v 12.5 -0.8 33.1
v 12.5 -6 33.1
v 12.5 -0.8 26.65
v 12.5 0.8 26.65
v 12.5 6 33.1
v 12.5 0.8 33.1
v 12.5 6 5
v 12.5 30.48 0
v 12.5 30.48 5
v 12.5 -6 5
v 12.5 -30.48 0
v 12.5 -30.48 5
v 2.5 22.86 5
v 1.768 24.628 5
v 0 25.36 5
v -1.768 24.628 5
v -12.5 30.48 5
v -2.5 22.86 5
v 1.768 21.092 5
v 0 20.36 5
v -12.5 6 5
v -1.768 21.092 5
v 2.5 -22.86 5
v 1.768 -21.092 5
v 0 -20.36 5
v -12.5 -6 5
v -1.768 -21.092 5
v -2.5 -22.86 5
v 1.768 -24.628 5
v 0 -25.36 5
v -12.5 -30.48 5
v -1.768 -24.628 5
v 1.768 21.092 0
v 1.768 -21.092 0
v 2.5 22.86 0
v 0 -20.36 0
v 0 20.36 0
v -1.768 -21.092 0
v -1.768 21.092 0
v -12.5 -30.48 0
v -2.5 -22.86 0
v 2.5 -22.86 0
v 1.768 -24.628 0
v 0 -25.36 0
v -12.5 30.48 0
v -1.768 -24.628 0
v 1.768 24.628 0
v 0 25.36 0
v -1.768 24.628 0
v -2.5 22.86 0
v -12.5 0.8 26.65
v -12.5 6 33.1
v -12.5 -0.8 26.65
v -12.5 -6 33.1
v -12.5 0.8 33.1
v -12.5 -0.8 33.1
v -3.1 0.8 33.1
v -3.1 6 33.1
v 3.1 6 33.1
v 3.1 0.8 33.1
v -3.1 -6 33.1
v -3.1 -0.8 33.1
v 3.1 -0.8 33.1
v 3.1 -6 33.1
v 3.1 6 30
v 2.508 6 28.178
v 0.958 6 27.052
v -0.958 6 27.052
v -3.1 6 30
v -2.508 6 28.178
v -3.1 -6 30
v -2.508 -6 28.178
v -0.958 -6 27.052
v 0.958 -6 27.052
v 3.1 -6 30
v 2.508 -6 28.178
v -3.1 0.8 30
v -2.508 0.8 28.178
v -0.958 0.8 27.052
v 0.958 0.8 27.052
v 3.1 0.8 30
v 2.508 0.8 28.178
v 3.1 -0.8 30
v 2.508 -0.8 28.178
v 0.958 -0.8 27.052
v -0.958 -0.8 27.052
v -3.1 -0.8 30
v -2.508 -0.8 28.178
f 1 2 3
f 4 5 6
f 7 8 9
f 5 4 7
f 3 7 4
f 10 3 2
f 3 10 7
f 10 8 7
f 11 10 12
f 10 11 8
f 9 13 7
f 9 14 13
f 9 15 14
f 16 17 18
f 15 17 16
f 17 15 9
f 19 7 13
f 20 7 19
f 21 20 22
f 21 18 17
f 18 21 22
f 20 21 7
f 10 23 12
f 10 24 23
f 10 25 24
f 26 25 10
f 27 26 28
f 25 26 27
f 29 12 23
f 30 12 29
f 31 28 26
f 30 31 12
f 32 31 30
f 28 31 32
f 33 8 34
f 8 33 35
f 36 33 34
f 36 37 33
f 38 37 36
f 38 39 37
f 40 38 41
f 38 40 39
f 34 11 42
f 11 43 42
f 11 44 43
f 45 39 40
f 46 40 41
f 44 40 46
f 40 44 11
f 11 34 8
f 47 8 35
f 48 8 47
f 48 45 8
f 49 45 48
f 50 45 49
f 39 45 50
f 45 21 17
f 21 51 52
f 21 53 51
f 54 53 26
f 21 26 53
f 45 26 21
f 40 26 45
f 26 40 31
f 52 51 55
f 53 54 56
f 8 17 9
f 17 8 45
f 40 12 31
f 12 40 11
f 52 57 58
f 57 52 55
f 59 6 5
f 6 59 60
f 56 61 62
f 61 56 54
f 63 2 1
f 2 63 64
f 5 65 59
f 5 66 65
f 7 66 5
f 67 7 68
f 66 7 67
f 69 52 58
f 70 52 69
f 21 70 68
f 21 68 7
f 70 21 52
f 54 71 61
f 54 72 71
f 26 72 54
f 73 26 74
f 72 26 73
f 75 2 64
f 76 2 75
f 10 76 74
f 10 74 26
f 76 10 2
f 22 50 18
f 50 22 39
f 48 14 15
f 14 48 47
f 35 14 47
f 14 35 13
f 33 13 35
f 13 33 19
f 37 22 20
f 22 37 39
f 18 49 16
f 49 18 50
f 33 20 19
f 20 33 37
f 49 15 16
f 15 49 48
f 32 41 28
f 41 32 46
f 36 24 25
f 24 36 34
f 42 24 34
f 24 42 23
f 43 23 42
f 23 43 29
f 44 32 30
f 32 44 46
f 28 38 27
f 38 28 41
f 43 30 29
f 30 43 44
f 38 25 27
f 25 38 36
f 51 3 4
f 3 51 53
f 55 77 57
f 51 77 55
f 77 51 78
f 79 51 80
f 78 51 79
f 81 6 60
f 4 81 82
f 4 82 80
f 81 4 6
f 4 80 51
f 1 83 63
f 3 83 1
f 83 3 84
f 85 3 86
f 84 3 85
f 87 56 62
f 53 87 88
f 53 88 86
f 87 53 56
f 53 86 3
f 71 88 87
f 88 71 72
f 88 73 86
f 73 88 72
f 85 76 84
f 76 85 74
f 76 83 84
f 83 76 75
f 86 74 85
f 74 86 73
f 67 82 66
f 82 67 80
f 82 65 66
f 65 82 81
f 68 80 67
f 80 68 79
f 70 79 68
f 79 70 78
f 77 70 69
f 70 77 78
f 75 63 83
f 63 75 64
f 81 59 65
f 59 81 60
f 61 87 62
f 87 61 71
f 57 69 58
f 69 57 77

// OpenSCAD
//Change to suit your system

// 60cc
//syringe_plung_thickness = 2.6;
//syringe_outer_diameter = 30.7;

// 10cc
//syringe_plung_thickness = 1.9;
//syringe_outer_diameter = 16.5;

// 3cc
//syringe_plung_thickness = 1.8;
//syringe_outer_diameter = 10.65;

// 1cc
syringe_plung_thickness = 1.6;
syringe_outer_diameter = 6.2;

center_of_rotation = 30;    // just an example




// Don't change unless you know what you are doing
percent_above_center_of_rotation = .5;
screw_hole_r = 2.5;     // automaticly 10mm away from edge of part
baseplate_w = 50;   // redefined in if
baseplate_h = 5;
baseplate_l = 7.62*8;   //MUST be divisable by 7.62 to fit on MEC board

upperslate_l = 12;  // redefined in if
upperslate_h = center_of_rotation+syringe_outer_diameter*percent_above_center_of_rotation; //simply the center of rotation plus any additional height added


if (syringe_outer_diameter <= 15) {
    baseplate_w = 25;
    upperslate_l = 12;

    difference() {
        // Main body
        union(){
            
            // Base Plate
            translate([0,0,2.5])
            cube([baseplate_w,baseplate_l,baseplate_h],center=true);
            
            // Upper Slate
            translate([0,0,upperslate_h/2])
            cube([baseplate_w,upperslate_l,upperslate_h],center=true);
        }
        
        // Screw holes
        translate([0,baseplate_l/2-7.62,0])
        cylinder (h=300,r=screw_hole_r);
        
        translate([0,-(baseplate_l/2-7.62),0])
        cylinder (h=300,r=screw_hole_r);
        
        
        // Slot
        translate([0,0,upperslate_h])
        cube([baseplate_w,syringe_plung_thickness,(syringe_outer_diameter+(syringe_outer_diameter+percent_above_center_of_rotation))],center=true);

        
        // Center Cylinder
            translate([0,0,upperslate_h-percent_above_center_of_rotation*syringe_outer_diameter])
            rotate([90,0,0])
        cylinder(h=300,r=syringe_outer_diameter/2);
        
            translate([0,0,upperslate_h-percent_above_center_of_rotation*syringe_outer_diameter])
            rotate([-90,0,0])
        cylinder(h=300,r=syringe_outer_diameter/2);
        
     
         // Center Square
            translate([0,0,upperslate_h])
            cube([syringe_outer_diameter,upperslate_l*2,syringe_outer_diameter*(percent_above_center_of_rotation*2)],center=true);
    }
}

if (syringe_outer_diameter > 15) {
    baseplate_w = 50;
    upperslate_l = 16;

    difference() {
        // Main body
        union(){
            
            // Base Plate
            translate([0,0,2.5])
            cube([baseplate_w,baseplate_l,baseplate_h],center=true);
            
            // Upper Slate
            translate([0,0,upperslate_h/2])
            cube([baseplate_w,upperslate_l,upperslate_h],center=true);
        }
        
        // Screw holes
        translate([0,baseplate_l/2-7.62,0])
        cylinder (h=300,r=screw_hole_r);
        
        translate([0,-(baseplate_l/2-7.62),0])
        cylinder (h=300,r=screw_hole_r);
        
        
        // Slot
        translate([0,0,upperslate_h])
        cube([baseplate_w,syringe_plung_thickness,(syringe_outer_diameter+(syringe_outer_diameter+percent_above_center_of_rotation))],center=true);

        
        // Center Cylinder
            translate([0,0,upperslate_h-percent_above_center_of_rotation*syringe_outer_diameter])
            rotate([90,0,0])
        cylinder(h=300,r=syringe_outer_diameter/2);
        
            translate([0,0,upperslate_h-percent_above_center_of_rotation*syringe_outer_diameter])
            rotate([-90,0,0])
        cylinder(h=300,r=syringe_outer_diameter/2);
        
     
         // Center Square
            translate([0,0,upperslate_h])
            cube([syringe_outer_diameter,upperslate_l*2,syringe_outer_diameter*(percent_above_center_of_rotation*2)],center=true);
    }
}
